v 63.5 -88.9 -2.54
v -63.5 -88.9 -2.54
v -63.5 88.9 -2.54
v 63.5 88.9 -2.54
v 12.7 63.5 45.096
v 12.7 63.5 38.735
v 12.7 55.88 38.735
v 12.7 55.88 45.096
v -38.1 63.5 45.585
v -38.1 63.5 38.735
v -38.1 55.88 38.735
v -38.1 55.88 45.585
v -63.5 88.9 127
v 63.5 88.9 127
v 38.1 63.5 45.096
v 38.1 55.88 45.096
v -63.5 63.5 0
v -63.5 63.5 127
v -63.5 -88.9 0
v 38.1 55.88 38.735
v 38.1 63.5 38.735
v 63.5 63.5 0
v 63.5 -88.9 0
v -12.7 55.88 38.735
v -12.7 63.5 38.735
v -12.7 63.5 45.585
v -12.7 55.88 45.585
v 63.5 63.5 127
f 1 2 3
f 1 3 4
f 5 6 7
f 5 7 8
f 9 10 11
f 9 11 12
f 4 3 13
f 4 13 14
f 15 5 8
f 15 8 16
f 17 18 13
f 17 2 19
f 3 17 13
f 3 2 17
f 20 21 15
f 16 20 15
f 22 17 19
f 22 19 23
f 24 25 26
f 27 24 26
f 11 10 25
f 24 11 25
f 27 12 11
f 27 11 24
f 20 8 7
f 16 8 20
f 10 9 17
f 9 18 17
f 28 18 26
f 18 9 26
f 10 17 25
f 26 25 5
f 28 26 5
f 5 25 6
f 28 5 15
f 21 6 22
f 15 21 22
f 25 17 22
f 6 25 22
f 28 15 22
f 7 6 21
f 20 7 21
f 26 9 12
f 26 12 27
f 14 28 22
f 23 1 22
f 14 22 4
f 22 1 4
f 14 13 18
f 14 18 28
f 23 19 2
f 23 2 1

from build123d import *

# Parameters (mm, degrees)
F0_W     = 127
F0_H     = 177.8
F1_DEPTH = 2.54
F2_W     = 127
F2_H     = 25.4
F3_DEPTH = 127
F4_W     = 25.4
F4_H     = 6.849984
F4_H_2   = 6.360701
F5_DEPTH = 7.62


with BuildPart() as f1:
    # F0 (on Top) → F1 (new body)
    with BuildSketch(Plane.XY):
        Rectangle(F0_W, F0_H)
    extrude(amount=-F1_DEPTH)

    # F2 (on face) → F3 (join)
    with BuildSketch(Plane.XY):
        with Locations((0, 76.2)):
            Rectangle(F2_W, F2_H)
    extrude(amount=F3_DEPTH)

    # F4 (on face) → F5 (join)
    with BuildSketch(Plane.XZ.offset(-63.5)):
        with Locations((-25.4, 42.159992)):
            Rectangle(F4_W, F4_H)
        with Locations((25.4, 41.915351)):
            Rectangle(F4_W, F4_H_2)
    extrude(amount=F5_DEPTH)


solid = f1.part
